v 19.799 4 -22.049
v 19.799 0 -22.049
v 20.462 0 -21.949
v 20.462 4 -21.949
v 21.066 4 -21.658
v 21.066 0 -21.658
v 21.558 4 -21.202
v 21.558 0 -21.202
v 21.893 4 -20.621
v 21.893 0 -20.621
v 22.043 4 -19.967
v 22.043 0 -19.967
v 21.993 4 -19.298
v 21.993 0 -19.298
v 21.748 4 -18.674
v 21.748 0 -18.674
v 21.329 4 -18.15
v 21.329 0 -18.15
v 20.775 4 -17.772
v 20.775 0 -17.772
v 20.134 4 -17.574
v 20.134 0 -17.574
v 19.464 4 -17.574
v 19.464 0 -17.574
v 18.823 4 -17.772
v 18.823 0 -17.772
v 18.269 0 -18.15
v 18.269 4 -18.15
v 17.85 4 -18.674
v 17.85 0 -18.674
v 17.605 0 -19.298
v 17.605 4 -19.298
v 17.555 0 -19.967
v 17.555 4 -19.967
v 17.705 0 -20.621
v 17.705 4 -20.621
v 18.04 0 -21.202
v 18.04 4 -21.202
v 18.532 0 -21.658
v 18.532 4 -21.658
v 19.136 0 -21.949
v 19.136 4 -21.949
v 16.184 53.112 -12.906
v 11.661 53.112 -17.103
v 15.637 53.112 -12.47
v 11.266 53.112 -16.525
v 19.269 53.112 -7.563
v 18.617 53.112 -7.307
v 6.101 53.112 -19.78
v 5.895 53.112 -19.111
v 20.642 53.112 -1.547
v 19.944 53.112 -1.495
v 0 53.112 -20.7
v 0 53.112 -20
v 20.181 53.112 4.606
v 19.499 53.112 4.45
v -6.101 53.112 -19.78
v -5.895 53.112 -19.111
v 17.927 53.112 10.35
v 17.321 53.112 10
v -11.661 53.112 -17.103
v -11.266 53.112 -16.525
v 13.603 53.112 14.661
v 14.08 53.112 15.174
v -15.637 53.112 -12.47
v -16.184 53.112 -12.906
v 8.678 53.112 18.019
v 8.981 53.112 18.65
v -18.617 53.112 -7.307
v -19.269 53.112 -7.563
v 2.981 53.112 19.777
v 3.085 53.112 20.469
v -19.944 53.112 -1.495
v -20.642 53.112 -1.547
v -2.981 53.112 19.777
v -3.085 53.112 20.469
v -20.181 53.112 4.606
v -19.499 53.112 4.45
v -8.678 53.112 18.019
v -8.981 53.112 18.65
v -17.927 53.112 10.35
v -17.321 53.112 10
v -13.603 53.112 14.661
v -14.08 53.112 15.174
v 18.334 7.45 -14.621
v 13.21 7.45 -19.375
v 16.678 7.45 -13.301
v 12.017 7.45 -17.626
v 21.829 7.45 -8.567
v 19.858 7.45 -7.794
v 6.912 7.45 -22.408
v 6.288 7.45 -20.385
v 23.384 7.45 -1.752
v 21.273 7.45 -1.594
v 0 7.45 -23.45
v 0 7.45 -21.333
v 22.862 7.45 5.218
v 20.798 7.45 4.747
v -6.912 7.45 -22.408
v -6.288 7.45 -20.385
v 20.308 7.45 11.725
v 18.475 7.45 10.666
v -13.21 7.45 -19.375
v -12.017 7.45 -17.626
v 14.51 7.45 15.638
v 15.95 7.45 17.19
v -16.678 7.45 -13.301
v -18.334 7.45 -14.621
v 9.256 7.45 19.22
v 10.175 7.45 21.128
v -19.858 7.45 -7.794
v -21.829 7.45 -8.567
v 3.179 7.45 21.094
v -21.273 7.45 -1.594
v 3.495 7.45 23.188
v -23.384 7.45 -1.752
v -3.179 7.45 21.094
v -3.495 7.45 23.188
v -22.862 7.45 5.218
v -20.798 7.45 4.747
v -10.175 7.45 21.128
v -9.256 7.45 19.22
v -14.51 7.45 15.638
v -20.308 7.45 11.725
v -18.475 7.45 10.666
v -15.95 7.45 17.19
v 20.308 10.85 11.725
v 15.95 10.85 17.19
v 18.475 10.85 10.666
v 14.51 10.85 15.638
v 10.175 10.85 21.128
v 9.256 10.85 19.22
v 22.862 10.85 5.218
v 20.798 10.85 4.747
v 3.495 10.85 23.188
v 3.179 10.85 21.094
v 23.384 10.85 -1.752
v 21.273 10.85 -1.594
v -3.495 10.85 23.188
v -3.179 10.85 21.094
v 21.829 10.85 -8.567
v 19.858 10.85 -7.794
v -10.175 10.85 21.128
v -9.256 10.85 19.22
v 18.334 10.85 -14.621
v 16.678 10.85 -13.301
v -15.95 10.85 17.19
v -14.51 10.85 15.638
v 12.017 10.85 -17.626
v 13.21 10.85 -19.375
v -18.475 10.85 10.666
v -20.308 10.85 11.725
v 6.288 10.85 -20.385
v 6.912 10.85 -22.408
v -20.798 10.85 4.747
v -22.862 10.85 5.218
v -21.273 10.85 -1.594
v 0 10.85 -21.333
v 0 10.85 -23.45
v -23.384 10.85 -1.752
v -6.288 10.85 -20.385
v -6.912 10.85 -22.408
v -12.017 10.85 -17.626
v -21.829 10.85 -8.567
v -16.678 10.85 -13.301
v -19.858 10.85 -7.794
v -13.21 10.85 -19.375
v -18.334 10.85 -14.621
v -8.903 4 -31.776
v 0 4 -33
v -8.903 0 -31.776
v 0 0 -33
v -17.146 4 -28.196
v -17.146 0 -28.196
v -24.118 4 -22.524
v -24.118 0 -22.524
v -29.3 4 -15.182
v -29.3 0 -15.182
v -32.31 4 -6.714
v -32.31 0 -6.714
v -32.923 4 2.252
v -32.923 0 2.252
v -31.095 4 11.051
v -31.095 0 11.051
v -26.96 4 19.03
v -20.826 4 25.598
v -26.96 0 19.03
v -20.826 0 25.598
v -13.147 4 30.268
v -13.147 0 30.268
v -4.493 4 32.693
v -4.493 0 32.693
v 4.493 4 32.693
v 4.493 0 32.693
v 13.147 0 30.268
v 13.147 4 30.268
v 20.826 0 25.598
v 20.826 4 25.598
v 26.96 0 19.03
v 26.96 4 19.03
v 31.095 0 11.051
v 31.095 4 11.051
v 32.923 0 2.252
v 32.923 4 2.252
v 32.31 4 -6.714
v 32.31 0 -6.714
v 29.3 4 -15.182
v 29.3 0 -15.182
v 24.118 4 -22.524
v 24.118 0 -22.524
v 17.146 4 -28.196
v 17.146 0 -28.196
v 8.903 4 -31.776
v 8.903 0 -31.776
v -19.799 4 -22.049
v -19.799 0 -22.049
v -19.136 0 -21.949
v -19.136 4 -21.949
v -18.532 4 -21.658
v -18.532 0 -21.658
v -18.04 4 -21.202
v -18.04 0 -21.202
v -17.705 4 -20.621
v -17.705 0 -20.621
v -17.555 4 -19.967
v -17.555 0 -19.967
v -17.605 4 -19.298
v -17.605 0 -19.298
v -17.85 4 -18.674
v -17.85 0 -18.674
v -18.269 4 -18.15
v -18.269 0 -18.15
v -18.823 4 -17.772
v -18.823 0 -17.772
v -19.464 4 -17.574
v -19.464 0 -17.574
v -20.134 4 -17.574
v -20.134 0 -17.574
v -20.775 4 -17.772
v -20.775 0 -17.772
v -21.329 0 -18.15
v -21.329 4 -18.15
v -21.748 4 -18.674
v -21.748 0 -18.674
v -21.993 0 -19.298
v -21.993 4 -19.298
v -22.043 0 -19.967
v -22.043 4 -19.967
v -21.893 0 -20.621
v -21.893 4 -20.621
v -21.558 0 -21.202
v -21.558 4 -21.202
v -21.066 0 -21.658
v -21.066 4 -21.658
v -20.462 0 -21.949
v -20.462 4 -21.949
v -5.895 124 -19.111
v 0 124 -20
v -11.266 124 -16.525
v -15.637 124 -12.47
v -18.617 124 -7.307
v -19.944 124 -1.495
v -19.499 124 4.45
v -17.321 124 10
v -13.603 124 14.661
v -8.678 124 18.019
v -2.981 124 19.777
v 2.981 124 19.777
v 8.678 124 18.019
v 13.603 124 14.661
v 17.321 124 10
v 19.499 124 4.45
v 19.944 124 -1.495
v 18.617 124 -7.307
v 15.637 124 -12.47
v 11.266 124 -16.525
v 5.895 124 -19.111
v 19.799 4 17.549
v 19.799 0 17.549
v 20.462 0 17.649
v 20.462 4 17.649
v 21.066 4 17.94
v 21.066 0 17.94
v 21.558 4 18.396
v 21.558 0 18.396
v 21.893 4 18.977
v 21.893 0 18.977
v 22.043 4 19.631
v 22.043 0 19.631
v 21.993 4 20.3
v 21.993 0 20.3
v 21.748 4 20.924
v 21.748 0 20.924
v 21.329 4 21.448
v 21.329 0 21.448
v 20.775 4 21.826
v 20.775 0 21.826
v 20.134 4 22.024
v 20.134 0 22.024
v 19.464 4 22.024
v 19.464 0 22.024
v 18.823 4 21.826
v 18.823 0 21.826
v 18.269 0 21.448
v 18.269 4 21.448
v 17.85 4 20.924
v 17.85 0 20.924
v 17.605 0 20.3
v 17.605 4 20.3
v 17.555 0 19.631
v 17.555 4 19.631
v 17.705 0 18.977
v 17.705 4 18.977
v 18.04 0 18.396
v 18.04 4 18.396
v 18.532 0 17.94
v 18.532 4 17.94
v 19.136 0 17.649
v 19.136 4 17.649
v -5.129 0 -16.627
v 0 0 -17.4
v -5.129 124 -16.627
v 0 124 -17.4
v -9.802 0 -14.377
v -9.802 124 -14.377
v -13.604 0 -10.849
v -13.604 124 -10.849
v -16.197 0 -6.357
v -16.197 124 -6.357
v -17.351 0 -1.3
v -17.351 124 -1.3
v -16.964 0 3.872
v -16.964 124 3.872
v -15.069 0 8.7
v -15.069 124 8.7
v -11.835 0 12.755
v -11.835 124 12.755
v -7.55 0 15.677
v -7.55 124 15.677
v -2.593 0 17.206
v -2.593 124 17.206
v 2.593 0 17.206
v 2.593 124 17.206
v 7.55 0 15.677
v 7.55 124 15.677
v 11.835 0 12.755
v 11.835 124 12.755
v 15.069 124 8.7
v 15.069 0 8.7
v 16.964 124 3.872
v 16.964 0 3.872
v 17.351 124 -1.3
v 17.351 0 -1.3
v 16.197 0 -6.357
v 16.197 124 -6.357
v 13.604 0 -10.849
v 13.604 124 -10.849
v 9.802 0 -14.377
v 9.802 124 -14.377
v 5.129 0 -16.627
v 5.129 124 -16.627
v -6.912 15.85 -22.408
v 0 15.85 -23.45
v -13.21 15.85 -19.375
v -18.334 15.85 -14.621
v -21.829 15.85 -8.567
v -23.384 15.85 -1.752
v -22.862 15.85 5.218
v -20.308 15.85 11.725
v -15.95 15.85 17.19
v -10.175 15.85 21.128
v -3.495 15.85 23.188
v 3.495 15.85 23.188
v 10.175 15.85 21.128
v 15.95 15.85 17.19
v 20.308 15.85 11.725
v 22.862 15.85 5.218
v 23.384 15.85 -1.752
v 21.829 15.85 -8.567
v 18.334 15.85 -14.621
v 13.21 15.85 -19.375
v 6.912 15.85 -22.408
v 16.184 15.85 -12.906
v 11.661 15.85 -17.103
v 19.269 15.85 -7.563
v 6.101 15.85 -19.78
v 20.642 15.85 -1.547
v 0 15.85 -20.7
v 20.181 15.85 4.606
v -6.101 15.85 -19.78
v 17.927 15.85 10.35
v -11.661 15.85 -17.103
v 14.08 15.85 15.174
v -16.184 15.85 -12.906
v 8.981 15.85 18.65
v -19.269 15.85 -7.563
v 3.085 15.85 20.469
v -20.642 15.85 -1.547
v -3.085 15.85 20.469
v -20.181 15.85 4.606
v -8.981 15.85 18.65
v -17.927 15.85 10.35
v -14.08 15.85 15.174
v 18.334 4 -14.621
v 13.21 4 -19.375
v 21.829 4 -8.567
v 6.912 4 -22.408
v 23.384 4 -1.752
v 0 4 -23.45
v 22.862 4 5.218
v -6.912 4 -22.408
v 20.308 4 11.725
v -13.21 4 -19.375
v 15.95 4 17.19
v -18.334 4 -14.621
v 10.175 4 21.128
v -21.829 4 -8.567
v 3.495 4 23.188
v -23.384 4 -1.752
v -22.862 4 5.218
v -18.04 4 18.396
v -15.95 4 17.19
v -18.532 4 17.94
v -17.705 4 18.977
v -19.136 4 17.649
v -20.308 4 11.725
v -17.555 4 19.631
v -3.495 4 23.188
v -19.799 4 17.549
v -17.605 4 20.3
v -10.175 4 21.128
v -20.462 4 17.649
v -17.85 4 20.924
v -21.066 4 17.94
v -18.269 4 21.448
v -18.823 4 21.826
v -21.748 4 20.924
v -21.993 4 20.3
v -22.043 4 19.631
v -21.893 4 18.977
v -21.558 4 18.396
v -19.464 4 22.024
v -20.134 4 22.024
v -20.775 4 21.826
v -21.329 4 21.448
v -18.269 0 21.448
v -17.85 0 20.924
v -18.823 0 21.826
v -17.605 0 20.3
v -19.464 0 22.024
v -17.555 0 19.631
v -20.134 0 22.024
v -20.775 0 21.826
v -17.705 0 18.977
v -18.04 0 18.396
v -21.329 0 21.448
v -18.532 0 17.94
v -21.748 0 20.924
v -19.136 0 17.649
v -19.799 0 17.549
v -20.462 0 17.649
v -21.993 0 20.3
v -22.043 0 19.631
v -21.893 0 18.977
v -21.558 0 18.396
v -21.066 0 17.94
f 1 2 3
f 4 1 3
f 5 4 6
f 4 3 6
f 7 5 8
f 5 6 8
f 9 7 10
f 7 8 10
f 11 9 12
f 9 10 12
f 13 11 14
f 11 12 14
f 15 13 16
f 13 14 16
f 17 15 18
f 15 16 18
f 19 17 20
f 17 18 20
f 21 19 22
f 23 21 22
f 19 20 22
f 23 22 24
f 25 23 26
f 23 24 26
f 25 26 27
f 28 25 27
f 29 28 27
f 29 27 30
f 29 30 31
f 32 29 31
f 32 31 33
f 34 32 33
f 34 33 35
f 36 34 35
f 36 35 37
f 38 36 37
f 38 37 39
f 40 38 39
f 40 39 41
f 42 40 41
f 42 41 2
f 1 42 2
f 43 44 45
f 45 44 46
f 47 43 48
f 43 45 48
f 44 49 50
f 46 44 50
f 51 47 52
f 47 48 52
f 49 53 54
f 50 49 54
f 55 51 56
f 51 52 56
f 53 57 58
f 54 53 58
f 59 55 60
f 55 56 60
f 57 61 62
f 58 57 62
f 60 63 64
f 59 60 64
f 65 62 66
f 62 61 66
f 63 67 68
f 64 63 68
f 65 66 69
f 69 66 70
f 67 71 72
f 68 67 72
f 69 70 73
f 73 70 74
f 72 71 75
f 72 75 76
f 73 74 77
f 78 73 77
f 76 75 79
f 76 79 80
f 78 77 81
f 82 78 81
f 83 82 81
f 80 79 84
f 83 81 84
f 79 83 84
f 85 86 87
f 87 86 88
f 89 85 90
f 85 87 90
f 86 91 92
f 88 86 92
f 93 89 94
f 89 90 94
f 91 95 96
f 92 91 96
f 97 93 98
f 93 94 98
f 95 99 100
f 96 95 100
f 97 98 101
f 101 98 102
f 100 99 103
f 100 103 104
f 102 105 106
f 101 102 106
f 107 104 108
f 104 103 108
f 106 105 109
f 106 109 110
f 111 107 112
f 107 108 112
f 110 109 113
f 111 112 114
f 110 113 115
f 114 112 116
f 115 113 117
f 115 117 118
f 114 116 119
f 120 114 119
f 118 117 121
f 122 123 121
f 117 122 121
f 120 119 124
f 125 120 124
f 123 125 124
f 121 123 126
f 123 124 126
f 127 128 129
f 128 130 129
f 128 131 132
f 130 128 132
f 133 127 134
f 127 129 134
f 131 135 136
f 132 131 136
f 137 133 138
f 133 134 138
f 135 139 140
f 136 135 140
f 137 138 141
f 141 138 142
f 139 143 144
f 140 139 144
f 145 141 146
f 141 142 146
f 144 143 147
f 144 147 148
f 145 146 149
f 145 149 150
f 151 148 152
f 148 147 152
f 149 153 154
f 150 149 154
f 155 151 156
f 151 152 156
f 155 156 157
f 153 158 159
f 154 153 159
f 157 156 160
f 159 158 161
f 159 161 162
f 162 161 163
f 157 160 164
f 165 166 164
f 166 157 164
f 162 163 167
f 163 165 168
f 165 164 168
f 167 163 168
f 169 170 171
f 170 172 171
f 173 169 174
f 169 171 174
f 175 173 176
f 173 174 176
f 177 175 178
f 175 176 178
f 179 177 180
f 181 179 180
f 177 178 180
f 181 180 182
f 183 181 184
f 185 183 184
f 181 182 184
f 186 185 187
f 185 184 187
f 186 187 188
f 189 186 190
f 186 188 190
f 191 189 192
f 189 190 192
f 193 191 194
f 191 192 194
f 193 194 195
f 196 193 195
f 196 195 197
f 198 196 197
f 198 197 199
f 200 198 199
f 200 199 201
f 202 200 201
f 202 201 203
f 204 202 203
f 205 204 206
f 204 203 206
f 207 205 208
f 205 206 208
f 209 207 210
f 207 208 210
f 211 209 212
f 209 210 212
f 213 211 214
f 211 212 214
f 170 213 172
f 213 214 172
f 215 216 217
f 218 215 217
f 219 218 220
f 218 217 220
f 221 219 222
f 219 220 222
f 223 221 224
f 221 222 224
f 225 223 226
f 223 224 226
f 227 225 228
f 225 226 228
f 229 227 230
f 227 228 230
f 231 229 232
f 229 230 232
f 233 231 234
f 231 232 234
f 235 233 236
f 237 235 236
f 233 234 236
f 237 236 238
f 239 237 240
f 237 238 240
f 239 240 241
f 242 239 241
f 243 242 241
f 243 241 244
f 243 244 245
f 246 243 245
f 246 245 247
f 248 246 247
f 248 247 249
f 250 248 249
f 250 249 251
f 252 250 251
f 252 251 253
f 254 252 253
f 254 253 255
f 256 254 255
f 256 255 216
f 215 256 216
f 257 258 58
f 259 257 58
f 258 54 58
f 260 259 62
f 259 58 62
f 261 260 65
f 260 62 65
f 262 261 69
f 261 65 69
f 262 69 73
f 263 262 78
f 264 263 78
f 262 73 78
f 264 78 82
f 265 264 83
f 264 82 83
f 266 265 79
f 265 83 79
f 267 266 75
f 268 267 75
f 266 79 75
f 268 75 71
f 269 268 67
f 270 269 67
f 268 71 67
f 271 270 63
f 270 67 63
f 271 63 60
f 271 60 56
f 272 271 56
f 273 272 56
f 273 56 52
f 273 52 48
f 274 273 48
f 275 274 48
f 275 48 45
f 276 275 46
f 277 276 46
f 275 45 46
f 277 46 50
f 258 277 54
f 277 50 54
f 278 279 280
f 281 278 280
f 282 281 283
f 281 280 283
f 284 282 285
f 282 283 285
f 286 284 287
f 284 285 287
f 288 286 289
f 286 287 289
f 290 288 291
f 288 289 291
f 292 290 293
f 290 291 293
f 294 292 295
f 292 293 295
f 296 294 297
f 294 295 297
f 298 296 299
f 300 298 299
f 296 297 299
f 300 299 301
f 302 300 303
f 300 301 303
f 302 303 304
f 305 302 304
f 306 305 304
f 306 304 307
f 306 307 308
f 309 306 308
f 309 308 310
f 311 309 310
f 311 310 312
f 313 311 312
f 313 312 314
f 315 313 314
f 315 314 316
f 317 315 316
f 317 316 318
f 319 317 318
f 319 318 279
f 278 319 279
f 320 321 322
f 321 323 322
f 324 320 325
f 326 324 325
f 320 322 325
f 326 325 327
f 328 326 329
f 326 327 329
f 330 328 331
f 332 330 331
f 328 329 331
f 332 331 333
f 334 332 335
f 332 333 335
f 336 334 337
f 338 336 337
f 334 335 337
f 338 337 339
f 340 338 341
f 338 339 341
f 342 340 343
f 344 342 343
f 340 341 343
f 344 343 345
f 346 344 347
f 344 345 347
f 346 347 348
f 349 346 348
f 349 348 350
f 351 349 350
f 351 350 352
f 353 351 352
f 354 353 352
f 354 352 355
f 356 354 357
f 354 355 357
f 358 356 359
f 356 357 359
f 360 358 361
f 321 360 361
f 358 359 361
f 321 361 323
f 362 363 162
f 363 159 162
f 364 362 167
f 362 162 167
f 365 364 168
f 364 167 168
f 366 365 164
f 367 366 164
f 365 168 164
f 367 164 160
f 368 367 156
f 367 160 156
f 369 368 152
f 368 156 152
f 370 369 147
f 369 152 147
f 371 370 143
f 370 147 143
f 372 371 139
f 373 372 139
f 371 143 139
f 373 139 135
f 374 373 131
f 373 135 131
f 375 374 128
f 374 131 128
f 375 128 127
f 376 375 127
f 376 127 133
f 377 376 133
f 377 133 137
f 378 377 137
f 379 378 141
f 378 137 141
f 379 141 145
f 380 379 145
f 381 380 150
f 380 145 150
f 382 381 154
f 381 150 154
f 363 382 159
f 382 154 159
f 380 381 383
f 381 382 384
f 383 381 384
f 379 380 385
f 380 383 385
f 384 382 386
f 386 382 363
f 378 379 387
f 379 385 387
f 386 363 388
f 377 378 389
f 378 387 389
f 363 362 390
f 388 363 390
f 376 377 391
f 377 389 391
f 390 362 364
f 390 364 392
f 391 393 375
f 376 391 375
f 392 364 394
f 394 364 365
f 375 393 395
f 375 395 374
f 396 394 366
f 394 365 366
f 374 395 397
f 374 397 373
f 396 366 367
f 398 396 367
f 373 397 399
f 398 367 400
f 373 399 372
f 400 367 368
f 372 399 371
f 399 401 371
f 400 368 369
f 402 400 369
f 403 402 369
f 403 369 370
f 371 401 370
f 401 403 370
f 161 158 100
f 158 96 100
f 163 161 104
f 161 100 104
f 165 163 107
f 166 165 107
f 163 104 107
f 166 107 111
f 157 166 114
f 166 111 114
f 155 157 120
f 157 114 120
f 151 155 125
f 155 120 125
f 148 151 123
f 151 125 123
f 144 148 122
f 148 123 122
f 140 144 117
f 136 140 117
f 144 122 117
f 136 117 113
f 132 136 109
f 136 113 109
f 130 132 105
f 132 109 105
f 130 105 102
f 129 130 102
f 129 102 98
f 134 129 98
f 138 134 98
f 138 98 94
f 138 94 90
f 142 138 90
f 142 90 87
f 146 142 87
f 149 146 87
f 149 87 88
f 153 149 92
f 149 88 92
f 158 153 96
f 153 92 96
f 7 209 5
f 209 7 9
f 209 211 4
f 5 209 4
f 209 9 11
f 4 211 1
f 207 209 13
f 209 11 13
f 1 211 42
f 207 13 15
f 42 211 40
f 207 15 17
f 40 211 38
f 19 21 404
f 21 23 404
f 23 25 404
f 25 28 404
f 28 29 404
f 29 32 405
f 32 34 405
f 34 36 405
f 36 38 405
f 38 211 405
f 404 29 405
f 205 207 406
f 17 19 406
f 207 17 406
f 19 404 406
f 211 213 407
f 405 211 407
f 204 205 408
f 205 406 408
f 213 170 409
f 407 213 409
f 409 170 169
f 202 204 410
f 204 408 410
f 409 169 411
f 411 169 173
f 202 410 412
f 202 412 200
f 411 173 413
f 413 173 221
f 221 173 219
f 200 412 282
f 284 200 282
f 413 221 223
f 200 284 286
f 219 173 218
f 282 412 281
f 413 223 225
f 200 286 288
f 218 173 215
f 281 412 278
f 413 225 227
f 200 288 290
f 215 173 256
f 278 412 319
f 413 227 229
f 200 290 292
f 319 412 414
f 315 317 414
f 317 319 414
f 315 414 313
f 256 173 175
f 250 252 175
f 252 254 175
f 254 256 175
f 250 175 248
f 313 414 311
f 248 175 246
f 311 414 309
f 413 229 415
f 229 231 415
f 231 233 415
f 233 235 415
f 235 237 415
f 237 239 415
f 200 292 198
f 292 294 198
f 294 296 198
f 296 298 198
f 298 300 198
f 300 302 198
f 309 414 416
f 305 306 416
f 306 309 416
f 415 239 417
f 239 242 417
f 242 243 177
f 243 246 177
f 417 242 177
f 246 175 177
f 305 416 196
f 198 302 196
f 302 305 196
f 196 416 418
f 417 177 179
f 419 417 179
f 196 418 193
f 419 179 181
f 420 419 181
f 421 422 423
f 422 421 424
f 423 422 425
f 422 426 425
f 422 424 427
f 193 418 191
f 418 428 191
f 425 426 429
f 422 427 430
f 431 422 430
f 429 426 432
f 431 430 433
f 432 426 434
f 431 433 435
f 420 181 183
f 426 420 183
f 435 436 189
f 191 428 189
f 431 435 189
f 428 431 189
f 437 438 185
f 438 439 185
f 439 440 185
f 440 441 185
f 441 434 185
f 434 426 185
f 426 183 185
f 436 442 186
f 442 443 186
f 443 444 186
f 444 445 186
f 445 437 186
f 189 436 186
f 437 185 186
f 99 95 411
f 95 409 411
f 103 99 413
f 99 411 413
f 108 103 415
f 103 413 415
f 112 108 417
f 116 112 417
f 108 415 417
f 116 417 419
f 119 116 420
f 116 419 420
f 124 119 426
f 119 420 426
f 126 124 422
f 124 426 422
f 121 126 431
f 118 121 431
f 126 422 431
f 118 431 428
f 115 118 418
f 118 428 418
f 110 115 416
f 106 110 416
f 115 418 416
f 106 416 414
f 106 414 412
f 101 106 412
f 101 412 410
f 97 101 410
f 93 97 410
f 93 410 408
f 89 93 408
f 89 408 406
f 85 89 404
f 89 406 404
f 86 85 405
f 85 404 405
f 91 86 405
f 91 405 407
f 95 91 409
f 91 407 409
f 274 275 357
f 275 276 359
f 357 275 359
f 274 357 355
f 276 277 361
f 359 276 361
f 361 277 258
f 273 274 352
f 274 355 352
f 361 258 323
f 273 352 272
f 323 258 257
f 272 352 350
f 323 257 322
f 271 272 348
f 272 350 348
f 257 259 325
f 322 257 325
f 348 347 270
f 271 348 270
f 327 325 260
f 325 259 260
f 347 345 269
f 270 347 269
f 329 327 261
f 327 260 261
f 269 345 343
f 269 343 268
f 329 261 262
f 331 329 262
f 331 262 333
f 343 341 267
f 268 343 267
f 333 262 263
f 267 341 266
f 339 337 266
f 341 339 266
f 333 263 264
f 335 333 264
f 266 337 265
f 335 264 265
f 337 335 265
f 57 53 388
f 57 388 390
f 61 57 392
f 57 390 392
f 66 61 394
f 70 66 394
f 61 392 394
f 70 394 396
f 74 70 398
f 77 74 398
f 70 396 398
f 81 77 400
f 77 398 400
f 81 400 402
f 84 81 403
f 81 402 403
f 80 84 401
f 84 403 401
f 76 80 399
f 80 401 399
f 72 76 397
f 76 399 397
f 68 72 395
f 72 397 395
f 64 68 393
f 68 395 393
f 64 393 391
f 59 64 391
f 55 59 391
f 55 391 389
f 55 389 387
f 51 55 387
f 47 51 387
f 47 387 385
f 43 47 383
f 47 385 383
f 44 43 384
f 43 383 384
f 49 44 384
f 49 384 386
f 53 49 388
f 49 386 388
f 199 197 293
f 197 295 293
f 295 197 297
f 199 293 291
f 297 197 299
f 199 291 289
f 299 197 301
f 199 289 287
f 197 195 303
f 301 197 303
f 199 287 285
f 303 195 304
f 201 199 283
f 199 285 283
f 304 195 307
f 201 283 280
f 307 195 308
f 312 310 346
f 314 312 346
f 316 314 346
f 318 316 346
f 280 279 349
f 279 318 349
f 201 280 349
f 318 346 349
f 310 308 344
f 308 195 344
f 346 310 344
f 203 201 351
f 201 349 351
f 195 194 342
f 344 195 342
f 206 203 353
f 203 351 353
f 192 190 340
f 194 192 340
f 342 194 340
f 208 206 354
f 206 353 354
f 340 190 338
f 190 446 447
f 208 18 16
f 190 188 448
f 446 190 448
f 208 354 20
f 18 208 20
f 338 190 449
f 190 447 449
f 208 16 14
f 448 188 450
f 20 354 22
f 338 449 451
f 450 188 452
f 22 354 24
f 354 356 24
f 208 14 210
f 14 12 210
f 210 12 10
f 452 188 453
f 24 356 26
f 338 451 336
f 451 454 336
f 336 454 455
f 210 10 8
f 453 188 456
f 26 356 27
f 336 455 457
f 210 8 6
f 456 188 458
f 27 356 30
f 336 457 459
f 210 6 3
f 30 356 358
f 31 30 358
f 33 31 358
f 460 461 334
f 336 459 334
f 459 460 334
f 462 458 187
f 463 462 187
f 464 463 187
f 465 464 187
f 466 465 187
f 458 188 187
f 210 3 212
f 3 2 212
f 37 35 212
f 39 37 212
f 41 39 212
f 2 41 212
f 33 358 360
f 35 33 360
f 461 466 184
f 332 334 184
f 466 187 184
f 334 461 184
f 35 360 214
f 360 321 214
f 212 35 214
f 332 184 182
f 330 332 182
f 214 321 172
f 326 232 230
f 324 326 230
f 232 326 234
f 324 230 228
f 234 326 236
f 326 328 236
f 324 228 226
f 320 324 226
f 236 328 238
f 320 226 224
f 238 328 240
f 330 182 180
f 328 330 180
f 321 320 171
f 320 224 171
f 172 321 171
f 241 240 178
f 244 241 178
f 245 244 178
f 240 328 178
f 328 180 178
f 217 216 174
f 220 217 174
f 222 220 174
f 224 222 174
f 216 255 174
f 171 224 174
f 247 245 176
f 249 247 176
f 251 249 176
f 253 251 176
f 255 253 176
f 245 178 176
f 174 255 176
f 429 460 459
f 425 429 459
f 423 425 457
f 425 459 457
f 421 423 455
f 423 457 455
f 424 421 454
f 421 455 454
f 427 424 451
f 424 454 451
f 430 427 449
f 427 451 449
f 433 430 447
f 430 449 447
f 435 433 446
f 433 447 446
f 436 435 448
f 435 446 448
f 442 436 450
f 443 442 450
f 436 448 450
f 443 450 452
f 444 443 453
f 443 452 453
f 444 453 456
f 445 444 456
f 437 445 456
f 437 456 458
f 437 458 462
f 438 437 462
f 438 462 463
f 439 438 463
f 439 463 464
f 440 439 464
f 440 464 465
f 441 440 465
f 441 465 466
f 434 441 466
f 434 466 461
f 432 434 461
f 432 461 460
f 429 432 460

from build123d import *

# Parameters (mm, degrees)
CUT_EXTRUDE1_REACH = 134.492
SKETCH2_R          = 2.25


with BuildPart() as part:
    # Sketch1 → Revolve1 (revolve)
    with BuildSketch(Plane.XY, mode=Mode.PRIVATE) as revolve1_sk:
        Polygon((17.4, 0), (17.4, 124), (20, 124), (20, 53.11246026), (20.7, 53.11246026), (20.7, 15.85), (23.45, 15.85), (23.45, 10.85), (21.33256308, 10.85), (21.33256308, 7.45), (23.45, 7.45), (23.45, 4), (33, 4), (33, 0), align=None)
    revolve(revolve1_sk.sketch.rotate(Axis((0, 0, 0), (0, 1, 0)), 90), axis=Axis((0, 0, 0), (0, 1, 0)))

    # Sketch2 → Cut-Extrude1 (cut, up to next)
    with BuildSketch(Plane.XZ, mode=Mode.PRIVATE) as cut_extrude1_sk1:
        with Locations(Location((-19.798989873, 19.798989873, 0), (0, 0, 270))):
            Circle(SKETCH2_R)
    cut_extrude1_tool1 = extrude(cut_extrude1_sk1.sketch, amount=-CUT_EXTRUDE1_REACH, mode=Mode.PRIVATE) & part.part
    # Sketch2 → Cut-Extrude1 (cut, up to next)
    with BuildSketch(Plane.XZ, mode=Mode.PRIVATE) as cut_extrude1_sk2:
        with Locations(Location((19.798989873, 19.798989873, 0), (0, 0, 270))):
            Circle(SKETCH2_R)
    cut_extrude1_tool2 = extrude(cut_extrude1_sk2.sketch, amount=-CUT_EXTRUDE1_REACH, mode=Mode.PRIVATE) & part.part
    # Sketch2 → Cut-Extrude1 (cut, up to next)
    with BuildSketch(Plane.XZ, mode=Mode.PRIVATE) as cut_extrude1_sk3:
        with Locations(Location((19.798989873, -19.798989873, 0), (0, 0, 270))):
            Circle(SKETCH2_R)
    cut_extrude1_tool3 = extrude(cut_extrude1_sk3.sketch, amount=-CUT_EXTRUDE1_REACH, mode=Mode.PRIVATE) & part.part
    # Sketch2 → Cut-Extrude1 (cut, up to next)
    with BuildSketch(Plane.XZ, mode=Mode.PRIVATE) as cut_extrude1_sk4:
        with Locations(Location((-19.798989873, -19.798989873, 0), (0, 0, 270))):
            Circle(SKETCH2_R)
    cut_extrude1_tool4 = extrude(cut_extrude1_sk4.sketch, amount=-CUT_EXTRUDE1_REACH, mode=Mode.PRIVATE) & part.part
    add(cut_extrude1_tool1.solids().sort_by_distance((-19.79899, 0, 19.79899))[0], mode=Mode.SUBTRACT)
    add(cut_extrude1_tool2.solids().sort_by_distance((19.79899, 0, 19.79899))[0], mode=Mode.SUBTRACT)
    add(cut_extrude1_tool3.solids().sort_by_distance((19.79899, 0, -19.79899))[0], mode=Mode.SUBTRACT)
    add(cut_extrude1_tool4.solids().sort_by_distance((-19.79899, 0, -19.79899))[0], mode=Mode.SUBTRACT)


solid = part.part
